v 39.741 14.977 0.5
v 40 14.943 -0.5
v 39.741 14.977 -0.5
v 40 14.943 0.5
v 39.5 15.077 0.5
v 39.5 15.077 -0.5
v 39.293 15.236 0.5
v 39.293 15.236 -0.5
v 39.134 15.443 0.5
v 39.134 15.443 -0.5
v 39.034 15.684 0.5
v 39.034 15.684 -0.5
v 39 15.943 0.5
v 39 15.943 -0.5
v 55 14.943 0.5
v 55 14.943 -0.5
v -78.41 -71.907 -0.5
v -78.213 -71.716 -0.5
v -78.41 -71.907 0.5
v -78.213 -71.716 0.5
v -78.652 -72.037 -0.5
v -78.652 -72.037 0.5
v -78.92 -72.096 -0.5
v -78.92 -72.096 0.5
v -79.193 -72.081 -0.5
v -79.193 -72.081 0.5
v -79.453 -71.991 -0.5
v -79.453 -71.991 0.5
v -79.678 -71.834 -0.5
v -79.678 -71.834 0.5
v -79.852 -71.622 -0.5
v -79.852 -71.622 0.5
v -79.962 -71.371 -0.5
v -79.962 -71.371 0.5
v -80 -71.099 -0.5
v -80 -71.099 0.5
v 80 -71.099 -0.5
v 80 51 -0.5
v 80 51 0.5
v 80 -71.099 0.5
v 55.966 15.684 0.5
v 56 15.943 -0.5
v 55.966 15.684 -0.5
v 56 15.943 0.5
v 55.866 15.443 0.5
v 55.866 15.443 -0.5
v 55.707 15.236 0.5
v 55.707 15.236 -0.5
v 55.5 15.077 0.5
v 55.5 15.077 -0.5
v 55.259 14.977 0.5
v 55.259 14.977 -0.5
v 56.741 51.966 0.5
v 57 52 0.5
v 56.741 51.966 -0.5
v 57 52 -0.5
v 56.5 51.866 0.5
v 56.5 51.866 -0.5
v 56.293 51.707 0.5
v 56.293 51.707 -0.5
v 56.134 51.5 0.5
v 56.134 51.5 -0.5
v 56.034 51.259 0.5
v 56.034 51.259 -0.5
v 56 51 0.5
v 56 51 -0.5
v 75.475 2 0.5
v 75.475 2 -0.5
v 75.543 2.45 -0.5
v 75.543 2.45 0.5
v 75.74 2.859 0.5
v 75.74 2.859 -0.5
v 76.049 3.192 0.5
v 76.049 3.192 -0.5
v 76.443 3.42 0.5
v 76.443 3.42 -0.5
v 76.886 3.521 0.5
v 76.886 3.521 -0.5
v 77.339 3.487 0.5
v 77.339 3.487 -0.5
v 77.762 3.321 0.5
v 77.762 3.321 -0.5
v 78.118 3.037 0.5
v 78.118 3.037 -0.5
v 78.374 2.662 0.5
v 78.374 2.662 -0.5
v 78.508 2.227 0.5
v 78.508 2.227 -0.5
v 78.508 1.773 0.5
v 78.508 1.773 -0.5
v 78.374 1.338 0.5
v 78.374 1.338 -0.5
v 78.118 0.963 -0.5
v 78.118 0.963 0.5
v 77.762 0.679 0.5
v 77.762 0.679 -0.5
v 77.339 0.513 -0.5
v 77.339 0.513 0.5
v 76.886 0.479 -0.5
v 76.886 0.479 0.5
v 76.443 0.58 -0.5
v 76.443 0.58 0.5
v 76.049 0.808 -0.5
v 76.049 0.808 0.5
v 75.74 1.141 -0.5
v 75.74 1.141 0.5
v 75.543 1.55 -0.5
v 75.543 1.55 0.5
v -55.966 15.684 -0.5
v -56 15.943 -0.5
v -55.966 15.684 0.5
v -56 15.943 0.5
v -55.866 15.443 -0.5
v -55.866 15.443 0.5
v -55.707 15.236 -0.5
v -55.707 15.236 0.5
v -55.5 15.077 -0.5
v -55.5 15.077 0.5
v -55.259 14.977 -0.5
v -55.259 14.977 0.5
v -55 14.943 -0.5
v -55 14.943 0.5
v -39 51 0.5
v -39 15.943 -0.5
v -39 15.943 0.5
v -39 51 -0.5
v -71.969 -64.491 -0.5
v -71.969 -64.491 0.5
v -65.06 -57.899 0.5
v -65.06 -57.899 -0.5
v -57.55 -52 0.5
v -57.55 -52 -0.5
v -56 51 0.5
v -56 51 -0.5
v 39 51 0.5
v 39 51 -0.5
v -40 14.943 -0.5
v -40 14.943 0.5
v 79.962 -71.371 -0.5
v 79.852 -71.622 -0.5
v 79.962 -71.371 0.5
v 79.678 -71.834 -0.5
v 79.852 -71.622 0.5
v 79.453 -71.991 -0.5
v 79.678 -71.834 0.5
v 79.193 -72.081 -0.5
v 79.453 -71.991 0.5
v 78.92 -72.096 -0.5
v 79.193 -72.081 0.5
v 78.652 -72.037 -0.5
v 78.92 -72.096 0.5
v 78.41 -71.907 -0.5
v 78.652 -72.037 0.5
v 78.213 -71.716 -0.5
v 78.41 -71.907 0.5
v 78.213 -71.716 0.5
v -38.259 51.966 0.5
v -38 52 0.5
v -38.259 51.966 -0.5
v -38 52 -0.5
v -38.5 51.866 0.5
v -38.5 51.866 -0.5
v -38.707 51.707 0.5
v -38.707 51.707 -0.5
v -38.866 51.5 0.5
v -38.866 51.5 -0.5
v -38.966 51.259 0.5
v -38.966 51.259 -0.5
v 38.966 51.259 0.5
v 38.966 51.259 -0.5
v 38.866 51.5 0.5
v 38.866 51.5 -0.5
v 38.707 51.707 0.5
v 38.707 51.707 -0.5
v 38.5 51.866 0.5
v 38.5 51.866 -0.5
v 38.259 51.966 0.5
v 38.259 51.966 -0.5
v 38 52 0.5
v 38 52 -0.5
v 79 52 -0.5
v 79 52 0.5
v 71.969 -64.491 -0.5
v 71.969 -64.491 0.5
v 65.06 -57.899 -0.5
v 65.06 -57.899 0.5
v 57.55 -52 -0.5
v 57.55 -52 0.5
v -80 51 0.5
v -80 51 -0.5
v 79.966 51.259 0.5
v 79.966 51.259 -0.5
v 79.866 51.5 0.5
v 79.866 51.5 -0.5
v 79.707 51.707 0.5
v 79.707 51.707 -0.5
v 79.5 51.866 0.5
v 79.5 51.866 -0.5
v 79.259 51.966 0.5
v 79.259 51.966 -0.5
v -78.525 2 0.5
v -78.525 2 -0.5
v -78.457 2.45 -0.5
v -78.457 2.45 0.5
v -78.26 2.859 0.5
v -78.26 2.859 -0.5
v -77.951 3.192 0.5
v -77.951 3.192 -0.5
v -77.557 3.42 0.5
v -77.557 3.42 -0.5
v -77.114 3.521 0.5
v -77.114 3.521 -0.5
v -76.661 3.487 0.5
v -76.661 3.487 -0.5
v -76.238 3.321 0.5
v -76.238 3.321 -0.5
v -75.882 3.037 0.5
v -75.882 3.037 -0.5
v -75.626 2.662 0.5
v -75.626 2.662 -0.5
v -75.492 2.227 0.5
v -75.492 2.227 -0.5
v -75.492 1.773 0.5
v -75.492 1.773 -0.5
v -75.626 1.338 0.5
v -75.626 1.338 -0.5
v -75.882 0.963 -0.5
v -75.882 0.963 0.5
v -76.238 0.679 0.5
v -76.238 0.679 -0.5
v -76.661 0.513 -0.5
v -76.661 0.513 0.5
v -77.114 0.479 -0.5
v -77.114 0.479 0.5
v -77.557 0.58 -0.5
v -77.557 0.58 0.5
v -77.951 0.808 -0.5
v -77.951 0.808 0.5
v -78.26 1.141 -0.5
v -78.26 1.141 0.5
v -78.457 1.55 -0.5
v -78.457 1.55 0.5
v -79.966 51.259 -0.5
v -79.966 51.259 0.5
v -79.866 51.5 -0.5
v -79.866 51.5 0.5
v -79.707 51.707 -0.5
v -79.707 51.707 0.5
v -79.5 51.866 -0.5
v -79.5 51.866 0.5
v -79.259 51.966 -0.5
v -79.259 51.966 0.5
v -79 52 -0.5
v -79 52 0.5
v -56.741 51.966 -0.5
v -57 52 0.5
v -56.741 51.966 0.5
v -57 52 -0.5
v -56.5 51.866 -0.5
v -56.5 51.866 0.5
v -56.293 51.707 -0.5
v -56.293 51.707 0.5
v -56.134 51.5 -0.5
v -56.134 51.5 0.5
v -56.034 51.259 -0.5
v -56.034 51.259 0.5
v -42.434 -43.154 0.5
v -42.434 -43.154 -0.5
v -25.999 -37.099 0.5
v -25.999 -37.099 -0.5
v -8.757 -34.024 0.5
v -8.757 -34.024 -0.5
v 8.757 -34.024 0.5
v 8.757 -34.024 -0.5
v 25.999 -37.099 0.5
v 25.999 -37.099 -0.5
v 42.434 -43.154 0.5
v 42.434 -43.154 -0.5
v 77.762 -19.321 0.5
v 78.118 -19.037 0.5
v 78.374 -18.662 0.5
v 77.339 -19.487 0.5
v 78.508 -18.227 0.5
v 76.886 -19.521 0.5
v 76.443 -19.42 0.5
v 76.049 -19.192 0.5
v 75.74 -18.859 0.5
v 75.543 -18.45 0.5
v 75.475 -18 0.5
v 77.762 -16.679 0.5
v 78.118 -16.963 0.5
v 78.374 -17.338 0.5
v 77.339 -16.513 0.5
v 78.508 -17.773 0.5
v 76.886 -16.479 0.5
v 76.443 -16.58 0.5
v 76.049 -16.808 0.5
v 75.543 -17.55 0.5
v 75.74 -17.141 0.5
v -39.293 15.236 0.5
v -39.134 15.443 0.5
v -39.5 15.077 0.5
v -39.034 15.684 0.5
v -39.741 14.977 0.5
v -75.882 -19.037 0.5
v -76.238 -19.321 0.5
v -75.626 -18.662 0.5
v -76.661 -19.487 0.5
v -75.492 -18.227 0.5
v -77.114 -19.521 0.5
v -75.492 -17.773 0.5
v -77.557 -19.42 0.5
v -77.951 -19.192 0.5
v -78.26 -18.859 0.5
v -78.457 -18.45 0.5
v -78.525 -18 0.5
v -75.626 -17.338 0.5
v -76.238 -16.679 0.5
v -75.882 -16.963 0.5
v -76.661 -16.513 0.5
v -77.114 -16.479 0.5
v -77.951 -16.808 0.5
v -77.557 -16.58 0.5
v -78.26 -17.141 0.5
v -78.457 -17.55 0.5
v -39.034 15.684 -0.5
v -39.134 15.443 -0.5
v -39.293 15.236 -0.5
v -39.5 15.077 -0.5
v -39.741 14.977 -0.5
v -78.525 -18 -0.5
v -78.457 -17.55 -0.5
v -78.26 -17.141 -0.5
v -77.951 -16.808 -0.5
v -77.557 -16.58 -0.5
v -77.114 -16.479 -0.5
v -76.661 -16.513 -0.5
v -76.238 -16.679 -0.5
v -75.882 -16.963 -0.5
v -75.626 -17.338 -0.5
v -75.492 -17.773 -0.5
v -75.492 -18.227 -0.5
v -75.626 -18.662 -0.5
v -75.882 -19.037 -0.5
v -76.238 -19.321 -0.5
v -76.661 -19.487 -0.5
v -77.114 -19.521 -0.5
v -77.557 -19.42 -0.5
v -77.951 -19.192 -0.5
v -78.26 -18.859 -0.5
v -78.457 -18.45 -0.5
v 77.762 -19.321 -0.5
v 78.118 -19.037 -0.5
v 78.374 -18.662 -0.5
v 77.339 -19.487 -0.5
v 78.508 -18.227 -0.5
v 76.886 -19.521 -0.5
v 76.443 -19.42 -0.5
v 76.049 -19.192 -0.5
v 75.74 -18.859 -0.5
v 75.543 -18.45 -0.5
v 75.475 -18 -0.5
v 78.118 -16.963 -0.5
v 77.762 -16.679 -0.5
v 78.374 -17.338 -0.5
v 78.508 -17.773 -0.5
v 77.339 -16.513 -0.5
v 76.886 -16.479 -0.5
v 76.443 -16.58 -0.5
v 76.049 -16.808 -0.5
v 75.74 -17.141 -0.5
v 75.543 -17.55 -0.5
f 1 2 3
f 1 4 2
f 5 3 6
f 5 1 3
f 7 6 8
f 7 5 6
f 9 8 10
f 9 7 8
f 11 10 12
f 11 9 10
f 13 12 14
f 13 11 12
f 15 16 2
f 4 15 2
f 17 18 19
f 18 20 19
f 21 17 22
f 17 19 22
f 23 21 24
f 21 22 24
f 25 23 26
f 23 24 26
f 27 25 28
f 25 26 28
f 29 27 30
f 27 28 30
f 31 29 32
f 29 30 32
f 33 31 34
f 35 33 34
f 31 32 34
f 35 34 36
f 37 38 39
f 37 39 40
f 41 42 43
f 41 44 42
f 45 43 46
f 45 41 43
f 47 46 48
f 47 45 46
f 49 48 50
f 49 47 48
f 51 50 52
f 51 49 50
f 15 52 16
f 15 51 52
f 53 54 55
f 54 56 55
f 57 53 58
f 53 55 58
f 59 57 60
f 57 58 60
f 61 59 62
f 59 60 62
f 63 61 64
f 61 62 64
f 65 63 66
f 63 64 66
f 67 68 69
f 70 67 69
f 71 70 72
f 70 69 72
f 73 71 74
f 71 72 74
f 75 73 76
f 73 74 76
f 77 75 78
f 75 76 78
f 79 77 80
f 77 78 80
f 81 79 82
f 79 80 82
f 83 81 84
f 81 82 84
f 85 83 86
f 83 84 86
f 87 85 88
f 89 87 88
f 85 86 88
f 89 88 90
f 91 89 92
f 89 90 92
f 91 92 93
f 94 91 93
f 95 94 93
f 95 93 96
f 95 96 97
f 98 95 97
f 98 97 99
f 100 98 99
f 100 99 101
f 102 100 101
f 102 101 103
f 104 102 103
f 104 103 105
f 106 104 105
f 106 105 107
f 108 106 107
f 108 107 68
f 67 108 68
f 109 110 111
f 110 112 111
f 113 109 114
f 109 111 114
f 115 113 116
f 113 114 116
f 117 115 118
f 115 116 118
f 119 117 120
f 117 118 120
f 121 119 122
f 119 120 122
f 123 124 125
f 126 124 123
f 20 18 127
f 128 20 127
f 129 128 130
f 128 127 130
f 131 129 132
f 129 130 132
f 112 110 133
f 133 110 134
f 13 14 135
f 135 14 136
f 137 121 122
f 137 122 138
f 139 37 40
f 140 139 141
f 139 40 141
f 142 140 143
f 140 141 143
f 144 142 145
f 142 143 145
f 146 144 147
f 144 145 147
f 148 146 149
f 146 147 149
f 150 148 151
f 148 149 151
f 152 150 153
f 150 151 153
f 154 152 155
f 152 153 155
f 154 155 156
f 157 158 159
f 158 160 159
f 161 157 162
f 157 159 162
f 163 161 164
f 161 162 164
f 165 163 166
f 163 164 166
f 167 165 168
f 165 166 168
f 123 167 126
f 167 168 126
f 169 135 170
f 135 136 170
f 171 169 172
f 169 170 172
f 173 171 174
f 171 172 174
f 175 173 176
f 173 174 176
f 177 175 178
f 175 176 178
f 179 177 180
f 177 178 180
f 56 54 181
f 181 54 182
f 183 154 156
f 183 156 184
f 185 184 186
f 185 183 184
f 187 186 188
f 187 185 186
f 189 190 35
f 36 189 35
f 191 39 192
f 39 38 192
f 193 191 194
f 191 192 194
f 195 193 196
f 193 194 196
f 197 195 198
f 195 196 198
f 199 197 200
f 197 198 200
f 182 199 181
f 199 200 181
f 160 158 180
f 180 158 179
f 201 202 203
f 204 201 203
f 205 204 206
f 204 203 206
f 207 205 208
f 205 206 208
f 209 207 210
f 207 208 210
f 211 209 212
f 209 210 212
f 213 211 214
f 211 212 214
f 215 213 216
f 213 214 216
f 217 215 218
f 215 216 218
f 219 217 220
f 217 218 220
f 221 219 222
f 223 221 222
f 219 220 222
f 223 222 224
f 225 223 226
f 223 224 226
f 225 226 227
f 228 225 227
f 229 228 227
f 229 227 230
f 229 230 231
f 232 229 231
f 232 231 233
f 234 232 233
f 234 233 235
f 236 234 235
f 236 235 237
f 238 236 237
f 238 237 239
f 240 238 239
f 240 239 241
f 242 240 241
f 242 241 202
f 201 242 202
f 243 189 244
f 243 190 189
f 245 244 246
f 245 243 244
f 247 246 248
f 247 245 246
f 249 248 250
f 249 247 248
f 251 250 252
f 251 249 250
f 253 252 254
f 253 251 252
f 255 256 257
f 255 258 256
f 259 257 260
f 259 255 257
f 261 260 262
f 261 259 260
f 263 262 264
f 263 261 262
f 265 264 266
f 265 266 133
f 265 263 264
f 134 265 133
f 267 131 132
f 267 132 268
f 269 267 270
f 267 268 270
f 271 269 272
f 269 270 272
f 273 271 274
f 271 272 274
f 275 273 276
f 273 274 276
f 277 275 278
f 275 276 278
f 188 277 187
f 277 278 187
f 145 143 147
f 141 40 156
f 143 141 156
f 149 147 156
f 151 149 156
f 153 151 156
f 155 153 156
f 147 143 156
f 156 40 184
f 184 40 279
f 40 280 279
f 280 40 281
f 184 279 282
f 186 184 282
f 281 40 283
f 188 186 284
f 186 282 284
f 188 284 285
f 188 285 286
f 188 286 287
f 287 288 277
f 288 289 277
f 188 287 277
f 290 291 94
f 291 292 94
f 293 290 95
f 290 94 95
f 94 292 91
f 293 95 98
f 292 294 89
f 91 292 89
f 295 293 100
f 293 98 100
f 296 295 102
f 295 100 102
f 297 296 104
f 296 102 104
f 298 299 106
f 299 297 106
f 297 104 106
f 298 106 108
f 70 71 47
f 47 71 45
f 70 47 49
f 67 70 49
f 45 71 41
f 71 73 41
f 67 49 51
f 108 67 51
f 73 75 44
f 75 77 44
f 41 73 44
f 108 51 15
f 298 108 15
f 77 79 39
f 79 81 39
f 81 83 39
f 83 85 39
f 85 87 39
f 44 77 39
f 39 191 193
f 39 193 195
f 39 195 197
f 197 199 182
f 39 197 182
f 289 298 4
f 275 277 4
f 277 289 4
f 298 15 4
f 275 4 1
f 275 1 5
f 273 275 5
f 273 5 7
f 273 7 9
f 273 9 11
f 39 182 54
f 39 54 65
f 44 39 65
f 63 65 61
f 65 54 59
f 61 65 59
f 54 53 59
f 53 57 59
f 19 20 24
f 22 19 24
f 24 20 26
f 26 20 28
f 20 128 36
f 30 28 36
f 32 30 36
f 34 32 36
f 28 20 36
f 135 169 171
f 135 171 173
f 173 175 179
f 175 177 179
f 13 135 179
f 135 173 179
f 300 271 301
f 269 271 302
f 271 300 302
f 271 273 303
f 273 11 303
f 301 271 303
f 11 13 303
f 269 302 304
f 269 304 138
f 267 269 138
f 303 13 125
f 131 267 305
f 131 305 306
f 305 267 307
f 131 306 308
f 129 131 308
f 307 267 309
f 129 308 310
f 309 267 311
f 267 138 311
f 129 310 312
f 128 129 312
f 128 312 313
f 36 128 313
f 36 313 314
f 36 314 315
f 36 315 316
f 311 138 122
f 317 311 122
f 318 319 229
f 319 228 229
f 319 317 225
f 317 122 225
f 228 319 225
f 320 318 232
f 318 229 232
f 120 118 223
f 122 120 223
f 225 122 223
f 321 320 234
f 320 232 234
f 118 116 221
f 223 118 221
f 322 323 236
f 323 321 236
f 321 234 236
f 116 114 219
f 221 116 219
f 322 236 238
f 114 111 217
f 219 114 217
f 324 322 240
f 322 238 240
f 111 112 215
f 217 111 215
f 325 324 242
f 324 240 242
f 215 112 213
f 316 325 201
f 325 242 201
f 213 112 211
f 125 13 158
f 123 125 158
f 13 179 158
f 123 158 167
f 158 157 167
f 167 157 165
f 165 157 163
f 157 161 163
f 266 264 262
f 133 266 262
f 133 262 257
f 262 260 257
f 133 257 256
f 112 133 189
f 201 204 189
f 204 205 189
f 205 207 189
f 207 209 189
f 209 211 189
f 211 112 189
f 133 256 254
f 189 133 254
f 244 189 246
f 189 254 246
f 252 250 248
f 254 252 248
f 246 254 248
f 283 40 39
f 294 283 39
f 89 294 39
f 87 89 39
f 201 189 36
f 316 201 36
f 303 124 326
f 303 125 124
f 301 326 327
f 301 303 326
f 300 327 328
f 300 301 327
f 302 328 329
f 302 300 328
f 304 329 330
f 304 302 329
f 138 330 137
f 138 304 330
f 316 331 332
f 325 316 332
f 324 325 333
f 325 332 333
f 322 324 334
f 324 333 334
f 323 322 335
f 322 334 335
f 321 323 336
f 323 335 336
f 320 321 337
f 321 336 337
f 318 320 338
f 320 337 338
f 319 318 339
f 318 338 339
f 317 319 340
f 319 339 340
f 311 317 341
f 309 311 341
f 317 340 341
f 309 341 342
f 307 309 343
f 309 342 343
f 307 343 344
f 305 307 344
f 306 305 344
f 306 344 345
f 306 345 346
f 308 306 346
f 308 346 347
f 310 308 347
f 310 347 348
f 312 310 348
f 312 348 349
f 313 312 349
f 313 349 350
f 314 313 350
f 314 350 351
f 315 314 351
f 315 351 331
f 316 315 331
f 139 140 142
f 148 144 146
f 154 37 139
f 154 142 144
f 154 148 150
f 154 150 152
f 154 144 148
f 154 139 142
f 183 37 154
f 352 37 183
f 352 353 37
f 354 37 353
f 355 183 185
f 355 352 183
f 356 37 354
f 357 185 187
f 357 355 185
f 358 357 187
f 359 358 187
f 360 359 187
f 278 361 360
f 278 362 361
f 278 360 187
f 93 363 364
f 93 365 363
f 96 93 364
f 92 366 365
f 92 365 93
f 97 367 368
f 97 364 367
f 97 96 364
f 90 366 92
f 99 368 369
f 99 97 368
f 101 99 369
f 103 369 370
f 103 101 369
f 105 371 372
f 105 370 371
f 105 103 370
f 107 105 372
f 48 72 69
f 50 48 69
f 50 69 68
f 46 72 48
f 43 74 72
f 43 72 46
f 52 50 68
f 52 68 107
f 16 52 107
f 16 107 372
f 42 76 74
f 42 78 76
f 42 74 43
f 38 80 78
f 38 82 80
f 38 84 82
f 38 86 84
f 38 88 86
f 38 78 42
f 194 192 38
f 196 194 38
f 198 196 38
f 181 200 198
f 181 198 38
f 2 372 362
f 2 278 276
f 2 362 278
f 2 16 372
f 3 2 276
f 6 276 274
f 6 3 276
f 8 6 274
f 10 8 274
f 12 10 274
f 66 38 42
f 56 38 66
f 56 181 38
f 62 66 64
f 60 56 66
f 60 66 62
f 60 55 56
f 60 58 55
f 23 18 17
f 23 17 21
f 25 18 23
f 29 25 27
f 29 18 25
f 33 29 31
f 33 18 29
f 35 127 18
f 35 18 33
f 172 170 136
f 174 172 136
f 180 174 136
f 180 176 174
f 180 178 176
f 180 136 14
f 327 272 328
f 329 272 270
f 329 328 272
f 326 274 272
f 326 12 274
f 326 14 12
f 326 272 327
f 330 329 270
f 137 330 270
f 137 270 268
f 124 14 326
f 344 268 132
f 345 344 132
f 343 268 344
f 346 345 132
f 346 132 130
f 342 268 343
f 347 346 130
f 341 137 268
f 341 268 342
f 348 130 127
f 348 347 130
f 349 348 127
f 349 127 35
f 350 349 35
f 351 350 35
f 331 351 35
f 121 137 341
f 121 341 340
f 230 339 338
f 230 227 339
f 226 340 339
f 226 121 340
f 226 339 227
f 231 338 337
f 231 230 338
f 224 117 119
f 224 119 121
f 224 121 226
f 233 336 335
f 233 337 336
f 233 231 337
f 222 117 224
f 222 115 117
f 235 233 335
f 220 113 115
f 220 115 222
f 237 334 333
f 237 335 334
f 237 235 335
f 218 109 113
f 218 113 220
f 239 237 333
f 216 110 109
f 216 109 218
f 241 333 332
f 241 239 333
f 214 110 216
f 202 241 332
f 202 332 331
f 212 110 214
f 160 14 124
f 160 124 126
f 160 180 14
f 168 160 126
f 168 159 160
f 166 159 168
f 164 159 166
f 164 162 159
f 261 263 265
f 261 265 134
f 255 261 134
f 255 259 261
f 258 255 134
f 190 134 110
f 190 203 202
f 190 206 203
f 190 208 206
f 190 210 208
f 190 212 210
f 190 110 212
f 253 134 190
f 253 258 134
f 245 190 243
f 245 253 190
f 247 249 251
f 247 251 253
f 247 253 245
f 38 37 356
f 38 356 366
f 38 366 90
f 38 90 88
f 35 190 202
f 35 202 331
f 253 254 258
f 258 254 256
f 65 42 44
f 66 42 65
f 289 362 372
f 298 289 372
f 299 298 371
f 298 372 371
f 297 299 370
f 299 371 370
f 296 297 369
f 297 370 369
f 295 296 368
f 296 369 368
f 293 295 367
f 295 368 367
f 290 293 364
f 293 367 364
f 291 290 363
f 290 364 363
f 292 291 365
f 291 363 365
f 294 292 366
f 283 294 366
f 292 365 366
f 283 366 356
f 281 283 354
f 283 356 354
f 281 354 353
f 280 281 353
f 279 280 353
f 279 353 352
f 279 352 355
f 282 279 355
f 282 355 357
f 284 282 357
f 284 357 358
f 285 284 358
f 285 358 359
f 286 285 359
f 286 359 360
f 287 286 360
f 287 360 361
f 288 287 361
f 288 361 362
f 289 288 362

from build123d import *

# Parameters (mm, degrees)
SKETCH_1_W           = 160
SKETCH_1_H           = 104
EXTRUDE_1_DEPTH      = 0.5
SKETCH_12_R          = 99.362749495
CUT_EXTRUDE_6_DEPTH  = 1
EXTRUDE_3_DEPTH      = 1
SKETCH_17_W          = 17
SKETCH_17_H          = 92.283863988
CUT_EXTRUDE_9_DEPTH  = 1
SKETCH_21_R          = 1.525
CUT_EXTRUDE_14_DEPTH = 10
FILLET_4_R           = 1


with BuildPart() as part:
    # 草图1 → 凸台-拉伸1 (new, symmetric)
    with BuildSketch(Plane.XY):
        Rectangle(SKETCH_1_W, SKETCH_1_H)
    extrude(amount=EXTRUDE_1_DEPTH, both=True)

    # 草图12 → 切除-拉伸6 (cut)
    with BuildSketch(Plane(origin=(0, 0, -0.5), x_dir=(-1, 0, 0), z_dir=(0, 0, -1))):
        with Locations((0, -133)):
            Circle(SKETCH_12_R)
    extrude(amount=-CUT_EXTRUDE_6_DEPTH, mode=Mode.SUBTRACT)

    # 草图13 → 凸台-拉伸3 (add)
    with BuildSketch(Plane(origin=(0, 0, -0.5), x_dir=(-1, 0, 0), z_dir=(0, 0, -1))):
        with BuildLine():
            Line((80, -52), (80, -74.068209027))
            ThreePointArc((80, -74.068209027), (69.654320002, -62.139350184), (57.549595892, -52))
            Line((57.549595892, -52), (80, -52))
        make_face()
    extrude_3 = extrude(amount=-EXTRUDE_3_DEPTH)

    # 镜向2: 凸台-拉伸3 across plane
    add(extrude_3.mirror(Plane(origin=(0, 0, 0), x_dir=(0, 0, 1), z_dir=(1, 0, 0))))

    # 草图17 → 切除-拉伸9 (cut)
    with BuildSketch(Plane(origin=(0, 0, -0.5), x_dir=(-1, 0, 0), z_dir=(0, 0, -1))):
        with Locations((-47.5, 61.084572681)):
            Rectangle(SKETCH_17_W, SKETCH_17_H)
    cut_extrude_9 = extrude(amount=-CUT_EXTRUDE_9_DEPTH, mode=Mode.SUBTRACT)

    # 镜向4: 切除-拉伸9 across plane
    add(cut_extrude_9.mirror(Plane(origin=(0, 0, 0), x_dir=(0, 0, 1), z_dir=(1, 0, 0))), mode=Mode.SUBTRACT)

    # 草图21 → 切除-拉伸14 (cut)
    with BuildSketch(Plane(origin=(0, 0, -0.5), x_dir=(-1, 0, 0), z_dir=(0, 0, -1))):
        with Locations((-77, 2)):
            Circle(SKETCH_21_R)
        with Locations((-77, -18)):
            Circle(SKETCH_21_R)
        with Locations((77, -18)):
            Circle(SKETCH_21_R)
        with Locations((77, 2)):
            Circle(SKETCH_21_R)
    extrude(amount=-CUT_EXTRUDE_14_DEPTH, mode=Mode.SUBTRACT)

    # 圆角4
    fillet_4_edges = [part.edges().sort_by_distance(p)[0] for p in [
        (-80, -74.068209027, 0),
        (80, -74.068209027, 0),
        (39, 52, 0),
        (56, 52, 0),
        (56, 14.942640687, 0),
        (39, 14.942640687, 0),
        (-39, 14.942640687, 0),
        (-56, 14.942640687, 0),
        (-56, 52, 0),
        (-39, 52, 0),
        (-80, 52, 0),
        (80, 52, 0),
    ]]
    fillet(fillet_4_edges, radius=FILLET_4_R)


solid = part.part
